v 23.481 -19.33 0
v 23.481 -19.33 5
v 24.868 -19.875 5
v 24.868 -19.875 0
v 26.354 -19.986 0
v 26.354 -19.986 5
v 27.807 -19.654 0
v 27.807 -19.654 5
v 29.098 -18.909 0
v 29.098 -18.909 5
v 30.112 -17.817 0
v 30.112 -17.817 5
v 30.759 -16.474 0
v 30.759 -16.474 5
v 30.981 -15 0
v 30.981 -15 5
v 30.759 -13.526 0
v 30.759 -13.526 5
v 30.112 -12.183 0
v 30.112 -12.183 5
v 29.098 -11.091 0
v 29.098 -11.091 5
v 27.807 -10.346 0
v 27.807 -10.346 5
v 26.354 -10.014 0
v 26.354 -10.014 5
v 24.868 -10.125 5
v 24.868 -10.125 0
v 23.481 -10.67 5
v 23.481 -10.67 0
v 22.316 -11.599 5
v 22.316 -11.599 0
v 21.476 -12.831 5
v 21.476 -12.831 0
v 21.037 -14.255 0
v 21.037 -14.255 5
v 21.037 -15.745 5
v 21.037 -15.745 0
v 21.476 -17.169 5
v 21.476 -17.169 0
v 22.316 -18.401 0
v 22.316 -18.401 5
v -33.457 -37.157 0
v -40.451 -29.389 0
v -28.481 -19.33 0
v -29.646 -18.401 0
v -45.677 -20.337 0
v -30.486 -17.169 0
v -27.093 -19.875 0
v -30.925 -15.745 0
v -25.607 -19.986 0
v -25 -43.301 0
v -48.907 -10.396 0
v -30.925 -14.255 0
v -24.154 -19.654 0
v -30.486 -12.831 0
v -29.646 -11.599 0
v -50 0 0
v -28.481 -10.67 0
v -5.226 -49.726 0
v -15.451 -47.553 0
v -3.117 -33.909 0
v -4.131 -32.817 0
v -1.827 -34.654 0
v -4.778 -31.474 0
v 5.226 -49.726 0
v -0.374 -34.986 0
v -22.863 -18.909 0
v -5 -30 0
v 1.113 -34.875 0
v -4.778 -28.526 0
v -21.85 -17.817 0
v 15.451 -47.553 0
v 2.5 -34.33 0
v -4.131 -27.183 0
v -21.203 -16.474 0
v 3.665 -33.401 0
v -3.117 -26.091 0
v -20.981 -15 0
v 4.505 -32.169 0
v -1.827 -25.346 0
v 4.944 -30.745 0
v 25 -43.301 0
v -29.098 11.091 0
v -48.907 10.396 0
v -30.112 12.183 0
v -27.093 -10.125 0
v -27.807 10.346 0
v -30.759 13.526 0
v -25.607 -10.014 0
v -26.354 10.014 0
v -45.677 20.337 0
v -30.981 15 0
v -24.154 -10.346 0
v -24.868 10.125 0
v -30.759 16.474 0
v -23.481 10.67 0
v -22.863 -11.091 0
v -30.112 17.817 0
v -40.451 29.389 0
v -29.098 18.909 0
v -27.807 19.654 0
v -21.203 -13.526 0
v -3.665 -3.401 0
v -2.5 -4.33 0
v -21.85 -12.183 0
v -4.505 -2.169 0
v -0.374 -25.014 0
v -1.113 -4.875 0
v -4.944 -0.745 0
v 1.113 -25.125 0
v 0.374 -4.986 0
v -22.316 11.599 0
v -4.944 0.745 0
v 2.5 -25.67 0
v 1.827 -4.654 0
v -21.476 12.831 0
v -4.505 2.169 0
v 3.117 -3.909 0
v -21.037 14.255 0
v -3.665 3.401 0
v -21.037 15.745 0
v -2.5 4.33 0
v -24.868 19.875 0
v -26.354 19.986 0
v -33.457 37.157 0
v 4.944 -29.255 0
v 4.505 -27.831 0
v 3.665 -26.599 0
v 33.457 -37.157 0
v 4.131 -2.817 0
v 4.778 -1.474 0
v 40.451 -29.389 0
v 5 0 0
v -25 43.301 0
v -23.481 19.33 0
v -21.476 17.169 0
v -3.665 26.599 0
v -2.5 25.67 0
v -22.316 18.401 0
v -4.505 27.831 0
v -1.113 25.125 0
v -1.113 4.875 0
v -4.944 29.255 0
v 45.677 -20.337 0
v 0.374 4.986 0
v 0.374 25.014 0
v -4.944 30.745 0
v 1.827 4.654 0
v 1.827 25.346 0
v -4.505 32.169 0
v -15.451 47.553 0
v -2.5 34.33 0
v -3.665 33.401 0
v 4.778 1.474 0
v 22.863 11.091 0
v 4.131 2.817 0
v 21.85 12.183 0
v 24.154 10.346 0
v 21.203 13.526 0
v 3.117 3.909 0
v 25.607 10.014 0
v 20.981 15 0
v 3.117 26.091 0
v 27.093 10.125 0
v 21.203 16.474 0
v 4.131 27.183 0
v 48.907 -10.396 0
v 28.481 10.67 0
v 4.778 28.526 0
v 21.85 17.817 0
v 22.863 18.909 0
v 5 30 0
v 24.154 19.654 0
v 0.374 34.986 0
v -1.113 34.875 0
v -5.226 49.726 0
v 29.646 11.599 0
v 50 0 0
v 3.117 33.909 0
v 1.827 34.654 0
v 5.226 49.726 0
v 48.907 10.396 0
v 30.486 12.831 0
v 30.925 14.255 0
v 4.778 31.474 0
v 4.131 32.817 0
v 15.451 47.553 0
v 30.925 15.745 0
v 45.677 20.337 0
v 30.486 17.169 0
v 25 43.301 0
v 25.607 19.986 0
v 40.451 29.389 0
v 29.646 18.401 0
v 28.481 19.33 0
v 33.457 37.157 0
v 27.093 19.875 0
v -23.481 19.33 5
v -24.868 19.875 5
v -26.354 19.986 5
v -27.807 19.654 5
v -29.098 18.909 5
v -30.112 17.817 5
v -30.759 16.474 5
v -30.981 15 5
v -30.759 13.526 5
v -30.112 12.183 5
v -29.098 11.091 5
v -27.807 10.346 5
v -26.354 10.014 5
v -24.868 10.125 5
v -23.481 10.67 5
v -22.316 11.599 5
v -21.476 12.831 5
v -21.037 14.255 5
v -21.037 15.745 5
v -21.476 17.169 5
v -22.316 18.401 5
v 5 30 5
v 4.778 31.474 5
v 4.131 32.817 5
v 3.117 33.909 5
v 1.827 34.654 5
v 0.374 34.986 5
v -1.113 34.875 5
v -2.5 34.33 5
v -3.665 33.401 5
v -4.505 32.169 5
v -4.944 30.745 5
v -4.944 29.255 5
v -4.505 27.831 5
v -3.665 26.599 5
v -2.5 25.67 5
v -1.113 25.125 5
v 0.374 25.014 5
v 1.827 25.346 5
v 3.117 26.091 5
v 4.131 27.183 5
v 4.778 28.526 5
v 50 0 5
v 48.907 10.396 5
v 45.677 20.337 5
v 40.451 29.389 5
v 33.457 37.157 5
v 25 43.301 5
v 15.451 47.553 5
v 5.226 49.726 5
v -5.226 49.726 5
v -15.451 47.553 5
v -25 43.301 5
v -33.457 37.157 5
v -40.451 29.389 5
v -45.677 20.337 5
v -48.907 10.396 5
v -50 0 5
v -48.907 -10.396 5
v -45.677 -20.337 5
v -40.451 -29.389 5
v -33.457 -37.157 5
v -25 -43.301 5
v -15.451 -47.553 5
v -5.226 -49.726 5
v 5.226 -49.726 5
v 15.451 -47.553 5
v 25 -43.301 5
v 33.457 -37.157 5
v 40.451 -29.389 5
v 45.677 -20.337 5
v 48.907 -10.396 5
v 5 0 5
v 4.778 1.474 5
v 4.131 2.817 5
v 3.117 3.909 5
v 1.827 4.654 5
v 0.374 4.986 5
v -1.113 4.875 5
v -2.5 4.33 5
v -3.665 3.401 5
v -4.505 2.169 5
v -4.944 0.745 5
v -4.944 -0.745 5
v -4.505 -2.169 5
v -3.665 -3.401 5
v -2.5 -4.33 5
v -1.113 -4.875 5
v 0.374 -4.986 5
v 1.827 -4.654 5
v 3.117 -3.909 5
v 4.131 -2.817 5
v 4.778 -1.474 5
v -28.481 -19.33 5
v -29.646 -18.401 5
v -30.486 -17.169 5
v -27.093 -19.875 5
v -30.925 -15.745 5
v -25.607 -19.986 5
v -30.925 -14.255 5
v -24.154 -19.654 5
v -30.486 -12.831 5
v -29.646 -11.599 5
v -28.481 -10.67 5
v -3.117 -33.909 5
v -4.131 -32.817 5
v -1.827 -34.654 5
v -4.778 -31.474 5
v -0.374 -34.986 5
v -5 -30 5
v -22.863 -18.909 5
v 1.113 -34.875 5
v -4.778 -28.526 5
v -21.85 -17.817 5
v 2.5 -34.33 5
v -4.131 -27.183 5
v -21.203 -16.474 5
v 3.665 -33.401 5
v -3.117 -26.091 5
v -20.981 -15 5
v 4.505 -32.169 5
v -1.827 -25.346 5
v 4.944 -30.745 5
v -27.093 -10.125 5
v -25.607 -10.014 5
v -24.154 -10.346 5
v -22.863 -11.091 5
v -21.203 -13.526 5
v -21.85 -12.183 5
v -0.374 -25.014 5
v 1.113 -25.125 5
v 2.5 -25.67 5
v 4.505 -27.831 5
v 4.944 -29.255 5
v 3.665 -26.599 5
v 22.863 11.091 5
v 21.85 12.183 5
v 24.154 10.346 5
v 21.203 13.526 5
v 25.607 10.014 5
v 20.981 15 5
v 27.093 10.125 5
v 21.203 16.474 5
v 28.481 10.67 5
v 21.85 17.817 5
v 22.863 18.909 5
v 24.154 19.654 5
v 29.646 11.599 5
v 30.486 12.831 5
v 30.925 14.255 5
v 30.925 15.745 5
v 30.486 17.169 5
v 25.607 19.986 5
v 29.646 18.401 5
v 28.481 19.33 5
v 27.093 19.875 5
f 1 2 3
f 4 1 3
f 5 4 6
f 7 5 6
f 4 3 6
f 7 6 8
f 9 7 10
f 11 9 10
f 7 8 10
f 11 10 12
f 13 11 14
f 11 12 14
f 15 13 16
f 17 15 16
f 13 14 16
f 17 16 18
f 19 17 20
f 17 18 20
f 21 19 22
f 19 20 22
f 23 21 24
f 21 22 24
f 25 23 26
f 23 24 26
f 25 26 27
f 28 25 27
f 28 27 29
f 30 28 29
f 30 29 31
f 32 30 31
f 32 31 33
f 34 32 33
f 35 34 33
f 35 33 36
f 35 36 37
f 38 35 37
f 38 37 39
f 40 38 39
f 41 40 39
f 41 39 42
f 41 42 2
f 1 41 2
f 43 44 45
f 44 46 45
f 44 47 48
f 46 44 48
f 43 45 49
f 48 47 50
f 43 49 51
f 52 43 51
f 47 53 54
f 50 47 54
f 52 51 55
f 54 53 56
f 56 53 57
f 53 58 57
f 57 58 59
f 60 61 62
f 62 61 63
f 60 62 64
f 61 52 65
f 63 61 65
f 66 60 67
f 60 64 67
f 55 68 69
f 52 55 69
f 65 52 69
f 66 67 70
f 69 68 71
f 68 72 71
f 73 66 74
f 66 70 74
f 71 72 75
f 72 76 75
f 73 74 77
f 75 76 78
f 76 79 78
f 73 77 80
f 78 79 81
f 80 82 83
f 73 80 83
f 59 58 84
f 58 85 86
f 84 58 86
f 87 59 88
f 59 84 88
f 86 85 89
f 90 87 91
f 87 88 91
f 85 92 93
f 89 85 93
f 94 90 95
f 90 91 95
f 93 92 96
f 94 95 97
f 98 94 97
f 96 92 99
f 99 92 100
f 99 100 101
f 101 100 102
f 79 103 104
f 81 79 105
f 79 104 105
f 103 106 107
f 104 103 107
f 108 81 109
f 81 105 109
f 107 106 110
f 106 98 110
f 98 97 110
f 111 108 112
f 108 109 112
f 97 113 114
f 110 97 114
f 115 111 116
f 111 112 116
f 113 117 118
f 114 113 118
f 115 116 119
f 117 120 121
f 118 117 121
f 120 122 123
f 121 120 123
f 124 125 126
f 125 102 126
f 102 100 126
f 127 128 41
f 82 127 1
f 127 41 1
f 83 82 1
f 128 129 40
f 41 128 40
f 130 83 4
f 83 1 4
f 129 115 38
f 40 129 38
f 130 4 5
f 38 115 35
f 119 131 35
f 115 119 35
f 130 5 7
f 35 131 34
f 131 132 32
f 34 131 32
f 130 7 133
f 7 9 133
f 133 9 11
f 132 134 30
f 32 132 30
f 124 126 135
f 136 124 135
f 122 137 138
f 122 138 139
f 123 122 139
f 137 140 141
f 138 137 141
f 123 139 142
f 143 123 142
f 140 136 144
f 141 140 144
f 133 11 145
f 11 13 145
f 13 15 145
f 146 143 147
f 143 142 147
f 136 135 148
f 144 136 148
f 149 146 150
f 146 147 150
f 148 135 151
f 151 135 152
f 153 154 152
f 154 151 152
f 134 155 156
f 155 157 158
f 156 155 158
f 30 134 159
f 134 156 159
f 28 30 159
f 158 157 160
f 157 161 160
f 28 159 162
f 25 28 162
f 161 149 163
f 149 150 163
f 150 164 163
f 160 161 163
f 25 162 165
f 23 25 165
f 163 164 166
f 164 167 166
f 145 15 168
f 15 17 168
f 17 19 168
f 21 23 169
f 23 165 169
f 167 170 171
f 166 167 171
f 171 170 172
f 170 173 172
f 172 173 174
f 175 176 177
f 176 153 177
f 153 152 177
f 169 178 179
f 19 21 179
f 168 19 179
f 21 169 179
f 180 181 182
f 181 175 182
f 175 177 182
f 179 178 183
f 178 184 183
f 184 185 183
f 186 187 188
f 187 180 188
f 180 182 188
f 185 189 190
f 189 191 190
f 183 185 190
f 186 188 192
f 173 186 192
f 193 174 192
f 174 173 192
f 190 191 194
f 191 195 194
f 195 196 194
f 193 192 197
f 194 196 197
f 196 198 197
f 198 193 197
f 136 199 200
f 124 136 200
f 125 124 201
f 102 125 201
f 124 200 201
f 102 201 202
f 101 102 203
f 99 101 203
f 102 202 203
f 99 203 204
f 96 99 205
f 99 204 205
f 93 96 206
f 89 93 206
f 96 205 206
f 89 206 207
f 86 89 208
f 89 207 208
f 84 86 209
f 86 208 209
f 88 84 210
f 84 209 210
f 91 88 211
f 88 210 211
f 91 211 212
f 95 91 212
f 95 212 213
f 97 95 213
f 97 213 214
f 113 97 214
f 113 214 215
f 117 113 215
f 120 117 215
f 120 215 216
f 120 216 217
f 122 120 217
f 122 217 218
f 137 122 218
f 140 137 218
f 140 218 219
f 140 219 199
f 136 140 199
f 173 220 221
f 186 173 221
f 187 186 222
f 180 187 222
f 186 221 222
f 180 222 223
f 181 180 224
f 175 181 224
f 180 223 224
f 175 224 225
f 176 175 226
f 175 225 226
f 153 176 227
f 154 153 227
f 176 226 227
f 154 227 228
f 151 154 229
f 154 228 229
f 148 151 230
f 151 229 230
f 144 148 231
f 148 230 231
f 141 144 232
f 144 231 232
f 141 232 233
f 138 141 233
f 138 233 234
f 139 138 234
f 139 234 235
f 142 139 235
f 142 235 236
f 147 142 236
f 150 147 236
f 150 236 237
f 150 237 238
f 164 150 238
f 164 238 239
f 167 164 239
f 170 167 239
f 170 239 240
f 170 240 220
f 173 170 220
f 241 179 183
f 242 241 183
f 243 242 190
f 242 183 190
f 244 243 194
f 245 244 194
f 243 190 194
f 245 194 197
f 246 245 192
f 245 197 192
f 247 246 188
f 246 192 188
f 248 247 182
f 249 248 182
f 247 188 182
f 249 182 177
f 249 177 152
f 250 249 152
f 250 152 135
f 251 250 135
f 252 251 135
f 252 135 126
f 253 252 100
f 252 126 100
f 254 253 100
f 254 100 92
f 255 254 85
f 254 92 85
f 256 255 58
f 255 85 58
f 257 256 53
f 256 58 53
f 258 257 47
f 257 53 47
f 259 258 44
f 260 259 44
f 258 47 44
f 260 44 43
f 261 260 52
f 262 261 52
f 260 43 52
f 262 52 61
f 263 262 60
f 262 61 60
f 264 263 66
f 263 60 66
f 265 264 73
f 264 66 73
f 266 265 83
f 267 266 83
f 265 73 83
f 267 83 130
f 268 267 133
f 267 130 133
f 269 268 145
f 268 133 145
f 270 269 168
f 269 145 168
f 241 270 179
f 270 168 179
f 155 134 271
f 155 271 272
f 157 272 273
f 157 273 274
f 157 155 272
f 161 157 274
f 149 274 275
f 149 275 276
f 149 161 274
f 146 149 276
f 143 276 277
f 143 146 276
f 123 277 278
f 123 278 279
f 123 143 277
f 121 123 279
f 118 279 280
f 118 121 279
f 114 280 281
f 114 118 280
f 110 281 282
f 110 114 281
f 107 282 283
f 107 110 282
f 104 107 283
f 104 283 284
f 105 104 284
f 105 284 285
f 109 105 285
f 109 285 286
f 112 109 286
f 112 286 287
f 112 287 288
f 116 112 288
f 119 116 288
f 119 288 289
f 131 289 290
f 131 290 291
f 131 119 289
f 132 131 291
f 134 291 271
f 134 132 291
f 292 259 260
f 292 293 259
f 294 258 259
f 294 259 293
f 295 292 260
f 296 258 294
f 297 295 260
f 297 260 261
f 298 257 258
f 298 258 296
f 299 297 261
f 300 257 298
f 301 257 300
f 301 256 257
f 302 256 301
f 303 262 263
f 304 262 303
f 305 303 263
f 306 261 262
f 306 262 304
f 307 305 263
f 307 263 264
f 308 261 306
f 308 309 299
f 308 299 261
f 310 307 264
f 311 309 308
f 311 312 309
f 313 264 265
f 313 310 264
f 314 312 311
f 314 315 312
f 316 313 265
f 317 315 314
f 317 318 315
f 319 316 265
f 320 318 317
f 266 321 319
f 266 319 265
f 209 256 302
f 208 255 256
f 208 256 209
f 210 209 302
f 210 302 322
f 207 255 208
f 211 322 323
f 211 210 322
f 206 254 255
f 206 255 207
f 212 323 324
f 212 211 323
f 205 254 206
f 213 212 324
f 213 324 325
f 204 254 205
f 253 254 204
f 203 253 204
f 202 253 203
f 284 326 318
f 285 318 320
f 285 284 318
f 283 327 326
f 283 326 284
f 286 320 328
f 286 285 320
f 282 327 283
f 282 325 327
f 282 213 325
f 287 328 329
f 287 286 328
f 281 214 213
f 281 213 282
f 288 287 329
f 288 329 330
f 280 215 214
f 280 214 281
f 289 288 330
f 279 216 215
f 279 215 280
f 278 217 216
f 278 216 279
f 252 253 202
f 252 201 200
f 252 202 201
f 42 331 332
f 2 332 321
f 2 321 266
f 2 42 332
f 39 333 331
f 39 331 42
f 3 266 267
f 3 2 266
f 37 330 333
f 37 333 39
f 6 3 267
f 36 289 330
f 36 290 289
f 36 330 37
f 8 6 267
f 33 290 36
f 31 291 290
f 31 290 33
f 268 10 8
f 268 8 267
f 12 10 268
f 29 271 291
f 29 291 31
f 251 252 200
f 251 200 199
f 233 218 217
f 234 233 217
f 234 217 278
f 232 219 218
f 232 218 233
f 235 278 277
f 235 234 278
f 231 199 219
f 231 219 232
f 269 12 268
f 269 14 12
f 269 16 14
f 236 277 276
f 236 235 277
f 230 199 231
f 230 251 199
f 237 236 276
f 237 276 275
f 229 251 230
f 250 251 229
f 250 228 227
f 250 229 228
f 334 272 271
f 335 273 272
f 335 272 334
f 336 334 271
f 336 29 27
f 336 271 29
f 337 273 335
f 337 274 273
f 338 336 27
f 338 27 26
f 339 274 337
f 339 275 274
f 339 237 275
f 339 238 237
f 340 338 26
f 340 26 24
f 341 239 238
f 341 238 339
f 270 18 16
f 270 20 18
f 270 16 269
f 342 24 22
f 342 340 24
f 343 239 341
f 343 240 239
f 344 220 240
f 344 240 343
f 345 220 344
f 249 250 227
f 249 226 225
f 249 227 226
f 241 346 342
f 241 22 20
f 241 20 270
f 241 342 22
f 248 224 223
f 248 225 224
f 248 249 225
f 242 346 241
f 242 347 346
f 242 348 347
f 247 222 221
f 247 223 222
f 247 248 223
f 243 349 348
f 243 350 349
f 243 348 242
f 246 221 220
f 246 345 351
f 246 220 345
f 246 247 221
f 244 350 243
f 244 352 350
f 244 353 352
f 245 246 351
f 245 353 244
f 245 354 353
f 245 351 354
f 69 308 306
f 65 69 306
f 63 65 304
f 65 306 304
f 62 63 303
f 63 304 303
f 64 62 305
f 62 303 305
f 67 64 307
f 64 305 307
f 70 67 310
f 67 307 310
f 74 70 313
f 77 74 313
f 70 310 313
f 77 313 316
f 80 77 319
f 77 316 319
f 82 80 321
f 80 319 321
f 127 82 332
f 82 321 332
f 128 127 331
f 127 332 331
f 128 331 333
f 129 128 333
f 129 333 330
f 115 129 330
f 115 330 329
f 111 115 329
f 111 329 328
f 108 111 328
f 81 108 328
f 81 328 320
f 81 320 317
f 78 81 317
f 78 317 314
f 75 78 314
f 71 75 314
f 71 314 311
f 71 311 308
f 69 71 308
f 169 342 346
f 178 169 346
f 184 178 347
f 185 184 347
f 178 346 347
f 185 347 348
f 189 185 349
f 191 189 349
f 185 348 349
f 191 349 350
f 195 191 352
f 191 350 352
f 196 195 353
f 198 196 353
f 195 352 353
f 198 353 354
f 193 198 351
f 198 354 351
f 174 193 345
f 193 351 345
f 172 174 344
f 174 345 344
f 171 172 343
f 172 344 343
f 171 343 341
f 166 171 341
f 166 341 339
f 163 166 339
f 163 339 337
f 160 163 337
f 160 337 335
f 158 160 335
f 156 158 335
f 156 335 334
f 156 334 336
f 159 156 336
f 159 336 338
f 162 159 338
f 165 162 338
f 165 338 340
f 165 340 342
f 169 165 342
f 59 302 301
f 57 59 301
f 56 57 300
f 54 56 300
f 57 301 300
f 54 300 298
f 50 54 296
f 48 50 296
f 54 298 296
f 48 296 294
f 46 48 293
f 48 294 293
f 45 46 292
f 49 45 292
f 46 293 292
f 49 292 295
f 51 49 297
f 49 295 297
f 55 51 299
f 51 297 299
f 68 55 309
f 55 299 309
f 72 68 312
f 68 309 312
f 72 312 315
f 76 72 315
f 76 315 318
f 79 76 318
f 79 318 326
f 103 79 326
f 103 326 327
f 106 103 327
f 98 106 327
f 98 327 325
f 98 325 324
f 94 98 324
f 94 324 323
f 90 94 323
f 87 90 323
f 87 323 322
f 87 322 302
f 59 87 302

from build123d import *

# Parameters (mm, degrees)
F0_R            = 50
F0_R_2          = 5
F1_DEPTH        = 5
F2_R            = 5
F3_DEPTH        = 25
F3_COPIES_COUNT = 6


# Not quite as in the source:
# - a pattern or mirror of a feature is missing from the dataset's text; its kind, count and spacing are read off the source's solid


with BuildPart() as f1:
    # F0 (on Top) → F1 (new body)
    with BuildSketch(Plane.XY):
        Circle(F0_R)
        Circle(F0_R_2, mode=Mode.SUBTRACT)
    extrude(amount=F1_DEPTH)

    # F2 (on face) → F3 (cut)
    with BuildSketch(Plane.XY.offset(5)):
        with Locations((0, 30)):
            Circle(F2_R)
    f3 = extrude(amount=-F3_DEPTH, mode=Mode.SUBTRACT)

    # F3_copies: F3 ×6 about axis
    f3_copies_axis = Axis((0, 0, 0), (0, 0, 1))
    for i in range(1, F3_COPIES_COUNT):
        add(f3.rotate(f3_copies_axis, i * 360 / F3_COPIES_COUNT), mode=Mode.SUBTRACT)


solid = f1.part
